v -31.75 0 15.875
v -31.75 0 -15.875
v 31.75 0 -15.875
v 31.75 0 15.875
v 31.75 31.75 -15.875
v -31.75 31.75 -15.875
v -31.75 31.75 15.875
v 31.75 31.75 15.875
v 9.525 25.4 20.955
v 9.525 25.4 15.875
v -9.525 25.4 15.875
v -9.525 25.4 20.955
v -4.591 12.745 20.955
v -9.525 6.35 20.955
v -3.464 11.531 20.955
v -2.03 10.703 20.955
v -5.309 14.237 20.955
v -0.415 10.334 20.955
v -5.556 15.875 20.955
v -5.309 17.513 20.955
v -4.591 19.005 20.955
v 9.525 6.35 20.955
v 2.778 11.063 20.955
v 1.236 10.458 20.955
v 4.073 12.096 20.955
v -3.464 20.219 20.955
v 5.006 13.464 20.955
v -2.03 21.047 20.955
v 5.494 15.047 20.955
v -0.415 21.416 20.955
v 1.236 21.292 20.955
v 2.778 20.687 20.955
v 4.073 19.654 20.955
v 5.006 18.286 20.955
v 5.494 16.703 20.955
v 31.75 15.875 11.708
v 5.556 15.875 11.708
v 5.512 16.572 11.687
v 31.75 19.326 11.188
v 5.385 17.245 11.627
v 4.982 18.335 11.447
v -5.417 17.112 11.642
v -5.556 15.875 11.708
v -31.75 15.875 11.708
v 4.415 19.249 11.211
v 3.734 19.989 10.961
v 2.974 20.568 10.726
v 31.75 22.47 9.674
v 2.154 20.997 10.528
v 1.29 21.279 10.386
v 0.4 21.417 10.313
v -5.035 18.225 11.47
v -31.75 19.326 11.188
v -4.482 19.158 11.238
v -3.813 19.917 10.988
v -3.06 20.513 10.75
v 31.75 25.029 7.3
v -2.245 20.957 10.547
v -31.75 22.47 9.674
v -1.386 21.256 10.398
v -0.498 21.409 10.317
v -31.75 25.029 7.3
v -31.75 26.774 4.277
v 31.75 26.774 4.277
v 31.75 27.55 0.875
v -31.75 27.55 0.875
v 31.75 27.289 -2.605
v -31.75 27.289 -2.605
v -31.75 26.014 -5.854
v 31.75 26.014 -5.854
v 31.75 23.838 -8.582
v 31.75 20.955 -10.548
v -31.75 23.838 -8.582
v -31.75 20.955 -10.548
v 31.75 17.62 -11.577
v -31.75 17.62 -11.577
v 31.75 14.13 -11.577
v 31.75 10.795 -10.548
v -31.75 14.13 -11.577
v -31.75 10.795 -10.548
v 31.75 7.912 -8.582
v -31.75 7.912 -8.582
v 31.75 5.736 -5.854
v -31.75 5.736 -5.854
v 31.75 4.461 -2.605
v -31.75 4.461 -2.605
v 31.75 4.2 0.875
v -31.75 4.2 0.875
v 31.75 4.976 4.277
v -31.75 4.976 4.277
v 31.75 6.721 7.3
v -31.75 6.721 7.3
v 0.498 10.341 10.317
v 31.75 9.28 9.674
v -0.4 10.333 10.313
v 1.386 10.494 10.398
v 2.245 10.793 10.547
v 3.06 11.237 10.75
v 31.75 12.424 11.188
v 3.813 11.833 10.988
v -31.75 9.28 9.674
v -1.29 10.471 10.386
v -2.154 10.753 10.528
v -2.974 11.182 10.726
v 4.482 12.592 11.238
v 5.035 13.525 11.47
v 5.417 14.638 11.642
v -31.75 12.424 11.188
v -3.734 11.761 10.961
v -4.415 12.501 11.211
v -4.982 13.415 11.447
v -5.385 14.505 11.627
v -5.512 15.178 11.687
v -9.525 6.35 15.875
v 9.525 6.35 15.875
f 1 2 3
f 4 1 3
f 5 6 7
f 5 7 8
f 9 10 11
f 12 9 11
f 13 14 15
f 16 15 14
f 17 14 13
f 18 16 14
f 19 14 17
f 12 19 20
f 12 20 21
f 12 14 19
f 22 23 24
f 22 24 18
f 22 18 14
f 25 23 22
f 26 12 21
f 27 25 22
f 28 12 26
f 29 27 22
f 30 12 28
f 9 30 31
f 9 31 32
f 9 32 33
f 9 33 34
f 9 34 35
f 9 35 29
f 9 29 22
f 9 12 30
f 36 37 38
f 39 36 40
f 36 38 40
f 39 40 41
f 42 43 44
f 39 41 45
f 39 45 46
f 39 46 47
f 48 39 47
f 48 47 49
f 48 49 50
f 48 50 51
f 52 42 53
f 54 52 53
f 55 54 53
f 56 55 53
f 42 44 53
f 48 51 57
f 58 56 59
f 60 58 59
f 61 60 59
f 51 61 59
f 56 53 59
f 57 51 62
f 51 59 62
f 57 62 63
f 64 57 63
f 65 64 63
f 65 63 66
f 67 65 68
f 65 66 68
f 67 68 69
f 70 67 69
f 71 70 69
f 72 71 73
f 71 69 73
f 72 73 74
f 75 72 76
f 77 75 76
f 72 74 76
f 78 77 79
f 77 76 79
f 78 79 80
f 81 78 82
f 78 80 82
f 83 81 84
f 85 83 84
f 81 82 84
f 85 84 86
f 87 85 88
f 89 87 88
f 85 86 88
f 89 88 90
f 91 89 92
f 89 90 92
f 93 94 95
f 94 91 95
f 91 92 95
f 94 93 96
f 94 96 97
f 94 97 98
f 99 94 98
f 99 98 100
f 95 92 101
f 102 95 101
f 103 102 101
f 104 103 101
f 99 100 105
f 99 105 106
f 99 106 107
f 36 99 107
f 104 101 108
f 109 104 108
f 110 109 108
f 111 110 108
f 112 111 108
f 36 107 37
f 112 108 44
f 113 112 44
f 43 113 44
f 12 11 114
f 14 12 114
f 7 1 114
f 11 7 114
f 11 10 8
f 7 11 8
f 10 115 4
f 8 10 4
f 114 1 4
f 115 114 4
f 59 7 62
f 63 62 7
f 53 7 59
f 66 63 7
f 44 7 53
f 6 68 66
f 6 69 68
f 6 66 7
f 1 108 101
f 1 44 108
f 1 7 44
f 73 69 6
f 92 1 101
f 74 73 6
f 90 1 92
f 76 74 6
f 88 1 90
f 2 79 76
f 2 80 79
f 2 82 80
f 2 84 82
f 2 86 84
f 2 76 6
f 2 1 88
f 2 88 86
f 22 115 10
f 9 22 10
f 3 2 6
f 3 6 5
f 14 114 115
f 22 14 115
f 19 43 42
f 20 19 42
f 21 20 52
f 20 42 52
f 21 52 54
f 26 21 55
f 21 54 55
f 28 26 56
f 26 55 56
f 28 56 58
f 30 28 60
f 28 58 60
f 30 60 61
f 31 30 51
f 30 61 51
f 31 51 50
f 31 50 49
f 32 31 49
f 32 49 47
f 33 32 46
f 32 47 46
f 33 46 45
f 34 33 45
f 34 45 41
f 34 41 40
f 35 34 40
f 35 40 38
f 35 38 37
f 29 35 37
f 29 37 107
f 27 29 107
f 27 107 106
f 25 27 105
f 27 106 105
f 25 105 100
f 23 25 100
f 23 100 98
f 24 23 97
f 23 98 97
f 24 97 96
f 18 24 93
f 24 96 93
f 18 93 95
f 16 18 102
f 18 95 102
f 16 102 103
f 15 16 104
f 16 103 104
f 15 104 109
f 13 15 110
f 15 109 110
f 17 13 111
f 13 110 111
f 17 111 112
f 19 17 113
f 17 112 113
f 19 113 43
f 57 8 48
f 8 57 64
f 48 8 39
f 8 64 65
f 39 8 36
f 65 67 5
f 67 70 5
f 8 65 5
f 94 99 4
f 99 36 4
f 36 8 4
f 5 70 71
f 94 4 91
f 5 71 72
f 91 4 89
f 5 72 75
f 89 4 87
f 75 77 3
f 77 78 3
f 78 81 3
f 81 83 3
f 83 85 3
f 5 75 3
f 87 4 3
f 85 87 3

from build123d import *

# Parameters (mm, degrees)
SKETCH2_W                          = 63.5
SKETCH2_H                          = 31.75
BOSS_EXTRUDE1_DEPTH                = 31.75
F_59_64_0_92188_DIAMETER_HOLE1_D   = 23.415752
BOSS_EXTRUDE2_DEPTH                = 5.08
F_7_16_0_4375_DIAMETER_HOLE1_D     = 11.1125
F_7_16_0_4375_DIAMETER_HOLE1_DEPTH = 25.4
F_7_16_0_4375_DIAMETER_HOLE1_TIP   = 3.338531814


with BuildPart() as part:
    # Sketch2 → Boss-Extrude1 (new body)
    with BuildSketch(Plane(origin=(0, 0, 0), x_dir=(1, 0, 0), z_dir=(0, 1, 0))):
        Rectangle(SKETCH2_W, SKETCH2_H)
    extrude(amount=BOSS_EXTRUDE1_DEPTH)

    # 59/64 (0.92188) Diameter Hole1 (through all)
    with Locations(Plane(origin=(31.75, 0, 0), x_dir=(0, 0, -1), z_dir=(1, 0, 0))):
        with Locations((0, 15.875)):
            Hole(F_59_64_0_92188_DIAMETER_HOLE1_D / 2)

    # Sketch10 → Boss-Extrude2 (add)
    with BuildSketch(Plane.XY.offset(15.875)):
        Polygon((9.525, 11.1125), (-9.525, 20.6375), (-9.525, 6.35), (9.525, 6.35), align=None)
        Polygon((-9.525, 25.4), (-9.525, 20.6375), (9.525, 11.1125), (9.525, 25.4), align=None)
    extrude(amount=BOSS_EXTRUDE2_DEPTH)

    # 7/16 (0.4375) Diameter Hole1
    with Locations(Plane.XY.offset(20.955)):
        with Locations((0, 15.875)):
            Hole(F_7_16_0_4375_DIAMETER_HOLE1_D / 2, depth=F_7_16_0_4375_DIAMETER_HOLE1_DEPTH)
            with Locations((0, 0, -(F_7_16_0_4375_DIAMETER_HOLE1_DEPTH + F_7_16_0_4375_DIAMETER_HOLE1_TIP / 2))):  # 118° drill point
                Cone(0, F_7_16_0_4375_DIAMETER_HOLE1_D / 2, F_7_16_0_4375_DIAMETER_HOLE1_TIP, mode=Mode.SUBTRACT)


solid = part.part
